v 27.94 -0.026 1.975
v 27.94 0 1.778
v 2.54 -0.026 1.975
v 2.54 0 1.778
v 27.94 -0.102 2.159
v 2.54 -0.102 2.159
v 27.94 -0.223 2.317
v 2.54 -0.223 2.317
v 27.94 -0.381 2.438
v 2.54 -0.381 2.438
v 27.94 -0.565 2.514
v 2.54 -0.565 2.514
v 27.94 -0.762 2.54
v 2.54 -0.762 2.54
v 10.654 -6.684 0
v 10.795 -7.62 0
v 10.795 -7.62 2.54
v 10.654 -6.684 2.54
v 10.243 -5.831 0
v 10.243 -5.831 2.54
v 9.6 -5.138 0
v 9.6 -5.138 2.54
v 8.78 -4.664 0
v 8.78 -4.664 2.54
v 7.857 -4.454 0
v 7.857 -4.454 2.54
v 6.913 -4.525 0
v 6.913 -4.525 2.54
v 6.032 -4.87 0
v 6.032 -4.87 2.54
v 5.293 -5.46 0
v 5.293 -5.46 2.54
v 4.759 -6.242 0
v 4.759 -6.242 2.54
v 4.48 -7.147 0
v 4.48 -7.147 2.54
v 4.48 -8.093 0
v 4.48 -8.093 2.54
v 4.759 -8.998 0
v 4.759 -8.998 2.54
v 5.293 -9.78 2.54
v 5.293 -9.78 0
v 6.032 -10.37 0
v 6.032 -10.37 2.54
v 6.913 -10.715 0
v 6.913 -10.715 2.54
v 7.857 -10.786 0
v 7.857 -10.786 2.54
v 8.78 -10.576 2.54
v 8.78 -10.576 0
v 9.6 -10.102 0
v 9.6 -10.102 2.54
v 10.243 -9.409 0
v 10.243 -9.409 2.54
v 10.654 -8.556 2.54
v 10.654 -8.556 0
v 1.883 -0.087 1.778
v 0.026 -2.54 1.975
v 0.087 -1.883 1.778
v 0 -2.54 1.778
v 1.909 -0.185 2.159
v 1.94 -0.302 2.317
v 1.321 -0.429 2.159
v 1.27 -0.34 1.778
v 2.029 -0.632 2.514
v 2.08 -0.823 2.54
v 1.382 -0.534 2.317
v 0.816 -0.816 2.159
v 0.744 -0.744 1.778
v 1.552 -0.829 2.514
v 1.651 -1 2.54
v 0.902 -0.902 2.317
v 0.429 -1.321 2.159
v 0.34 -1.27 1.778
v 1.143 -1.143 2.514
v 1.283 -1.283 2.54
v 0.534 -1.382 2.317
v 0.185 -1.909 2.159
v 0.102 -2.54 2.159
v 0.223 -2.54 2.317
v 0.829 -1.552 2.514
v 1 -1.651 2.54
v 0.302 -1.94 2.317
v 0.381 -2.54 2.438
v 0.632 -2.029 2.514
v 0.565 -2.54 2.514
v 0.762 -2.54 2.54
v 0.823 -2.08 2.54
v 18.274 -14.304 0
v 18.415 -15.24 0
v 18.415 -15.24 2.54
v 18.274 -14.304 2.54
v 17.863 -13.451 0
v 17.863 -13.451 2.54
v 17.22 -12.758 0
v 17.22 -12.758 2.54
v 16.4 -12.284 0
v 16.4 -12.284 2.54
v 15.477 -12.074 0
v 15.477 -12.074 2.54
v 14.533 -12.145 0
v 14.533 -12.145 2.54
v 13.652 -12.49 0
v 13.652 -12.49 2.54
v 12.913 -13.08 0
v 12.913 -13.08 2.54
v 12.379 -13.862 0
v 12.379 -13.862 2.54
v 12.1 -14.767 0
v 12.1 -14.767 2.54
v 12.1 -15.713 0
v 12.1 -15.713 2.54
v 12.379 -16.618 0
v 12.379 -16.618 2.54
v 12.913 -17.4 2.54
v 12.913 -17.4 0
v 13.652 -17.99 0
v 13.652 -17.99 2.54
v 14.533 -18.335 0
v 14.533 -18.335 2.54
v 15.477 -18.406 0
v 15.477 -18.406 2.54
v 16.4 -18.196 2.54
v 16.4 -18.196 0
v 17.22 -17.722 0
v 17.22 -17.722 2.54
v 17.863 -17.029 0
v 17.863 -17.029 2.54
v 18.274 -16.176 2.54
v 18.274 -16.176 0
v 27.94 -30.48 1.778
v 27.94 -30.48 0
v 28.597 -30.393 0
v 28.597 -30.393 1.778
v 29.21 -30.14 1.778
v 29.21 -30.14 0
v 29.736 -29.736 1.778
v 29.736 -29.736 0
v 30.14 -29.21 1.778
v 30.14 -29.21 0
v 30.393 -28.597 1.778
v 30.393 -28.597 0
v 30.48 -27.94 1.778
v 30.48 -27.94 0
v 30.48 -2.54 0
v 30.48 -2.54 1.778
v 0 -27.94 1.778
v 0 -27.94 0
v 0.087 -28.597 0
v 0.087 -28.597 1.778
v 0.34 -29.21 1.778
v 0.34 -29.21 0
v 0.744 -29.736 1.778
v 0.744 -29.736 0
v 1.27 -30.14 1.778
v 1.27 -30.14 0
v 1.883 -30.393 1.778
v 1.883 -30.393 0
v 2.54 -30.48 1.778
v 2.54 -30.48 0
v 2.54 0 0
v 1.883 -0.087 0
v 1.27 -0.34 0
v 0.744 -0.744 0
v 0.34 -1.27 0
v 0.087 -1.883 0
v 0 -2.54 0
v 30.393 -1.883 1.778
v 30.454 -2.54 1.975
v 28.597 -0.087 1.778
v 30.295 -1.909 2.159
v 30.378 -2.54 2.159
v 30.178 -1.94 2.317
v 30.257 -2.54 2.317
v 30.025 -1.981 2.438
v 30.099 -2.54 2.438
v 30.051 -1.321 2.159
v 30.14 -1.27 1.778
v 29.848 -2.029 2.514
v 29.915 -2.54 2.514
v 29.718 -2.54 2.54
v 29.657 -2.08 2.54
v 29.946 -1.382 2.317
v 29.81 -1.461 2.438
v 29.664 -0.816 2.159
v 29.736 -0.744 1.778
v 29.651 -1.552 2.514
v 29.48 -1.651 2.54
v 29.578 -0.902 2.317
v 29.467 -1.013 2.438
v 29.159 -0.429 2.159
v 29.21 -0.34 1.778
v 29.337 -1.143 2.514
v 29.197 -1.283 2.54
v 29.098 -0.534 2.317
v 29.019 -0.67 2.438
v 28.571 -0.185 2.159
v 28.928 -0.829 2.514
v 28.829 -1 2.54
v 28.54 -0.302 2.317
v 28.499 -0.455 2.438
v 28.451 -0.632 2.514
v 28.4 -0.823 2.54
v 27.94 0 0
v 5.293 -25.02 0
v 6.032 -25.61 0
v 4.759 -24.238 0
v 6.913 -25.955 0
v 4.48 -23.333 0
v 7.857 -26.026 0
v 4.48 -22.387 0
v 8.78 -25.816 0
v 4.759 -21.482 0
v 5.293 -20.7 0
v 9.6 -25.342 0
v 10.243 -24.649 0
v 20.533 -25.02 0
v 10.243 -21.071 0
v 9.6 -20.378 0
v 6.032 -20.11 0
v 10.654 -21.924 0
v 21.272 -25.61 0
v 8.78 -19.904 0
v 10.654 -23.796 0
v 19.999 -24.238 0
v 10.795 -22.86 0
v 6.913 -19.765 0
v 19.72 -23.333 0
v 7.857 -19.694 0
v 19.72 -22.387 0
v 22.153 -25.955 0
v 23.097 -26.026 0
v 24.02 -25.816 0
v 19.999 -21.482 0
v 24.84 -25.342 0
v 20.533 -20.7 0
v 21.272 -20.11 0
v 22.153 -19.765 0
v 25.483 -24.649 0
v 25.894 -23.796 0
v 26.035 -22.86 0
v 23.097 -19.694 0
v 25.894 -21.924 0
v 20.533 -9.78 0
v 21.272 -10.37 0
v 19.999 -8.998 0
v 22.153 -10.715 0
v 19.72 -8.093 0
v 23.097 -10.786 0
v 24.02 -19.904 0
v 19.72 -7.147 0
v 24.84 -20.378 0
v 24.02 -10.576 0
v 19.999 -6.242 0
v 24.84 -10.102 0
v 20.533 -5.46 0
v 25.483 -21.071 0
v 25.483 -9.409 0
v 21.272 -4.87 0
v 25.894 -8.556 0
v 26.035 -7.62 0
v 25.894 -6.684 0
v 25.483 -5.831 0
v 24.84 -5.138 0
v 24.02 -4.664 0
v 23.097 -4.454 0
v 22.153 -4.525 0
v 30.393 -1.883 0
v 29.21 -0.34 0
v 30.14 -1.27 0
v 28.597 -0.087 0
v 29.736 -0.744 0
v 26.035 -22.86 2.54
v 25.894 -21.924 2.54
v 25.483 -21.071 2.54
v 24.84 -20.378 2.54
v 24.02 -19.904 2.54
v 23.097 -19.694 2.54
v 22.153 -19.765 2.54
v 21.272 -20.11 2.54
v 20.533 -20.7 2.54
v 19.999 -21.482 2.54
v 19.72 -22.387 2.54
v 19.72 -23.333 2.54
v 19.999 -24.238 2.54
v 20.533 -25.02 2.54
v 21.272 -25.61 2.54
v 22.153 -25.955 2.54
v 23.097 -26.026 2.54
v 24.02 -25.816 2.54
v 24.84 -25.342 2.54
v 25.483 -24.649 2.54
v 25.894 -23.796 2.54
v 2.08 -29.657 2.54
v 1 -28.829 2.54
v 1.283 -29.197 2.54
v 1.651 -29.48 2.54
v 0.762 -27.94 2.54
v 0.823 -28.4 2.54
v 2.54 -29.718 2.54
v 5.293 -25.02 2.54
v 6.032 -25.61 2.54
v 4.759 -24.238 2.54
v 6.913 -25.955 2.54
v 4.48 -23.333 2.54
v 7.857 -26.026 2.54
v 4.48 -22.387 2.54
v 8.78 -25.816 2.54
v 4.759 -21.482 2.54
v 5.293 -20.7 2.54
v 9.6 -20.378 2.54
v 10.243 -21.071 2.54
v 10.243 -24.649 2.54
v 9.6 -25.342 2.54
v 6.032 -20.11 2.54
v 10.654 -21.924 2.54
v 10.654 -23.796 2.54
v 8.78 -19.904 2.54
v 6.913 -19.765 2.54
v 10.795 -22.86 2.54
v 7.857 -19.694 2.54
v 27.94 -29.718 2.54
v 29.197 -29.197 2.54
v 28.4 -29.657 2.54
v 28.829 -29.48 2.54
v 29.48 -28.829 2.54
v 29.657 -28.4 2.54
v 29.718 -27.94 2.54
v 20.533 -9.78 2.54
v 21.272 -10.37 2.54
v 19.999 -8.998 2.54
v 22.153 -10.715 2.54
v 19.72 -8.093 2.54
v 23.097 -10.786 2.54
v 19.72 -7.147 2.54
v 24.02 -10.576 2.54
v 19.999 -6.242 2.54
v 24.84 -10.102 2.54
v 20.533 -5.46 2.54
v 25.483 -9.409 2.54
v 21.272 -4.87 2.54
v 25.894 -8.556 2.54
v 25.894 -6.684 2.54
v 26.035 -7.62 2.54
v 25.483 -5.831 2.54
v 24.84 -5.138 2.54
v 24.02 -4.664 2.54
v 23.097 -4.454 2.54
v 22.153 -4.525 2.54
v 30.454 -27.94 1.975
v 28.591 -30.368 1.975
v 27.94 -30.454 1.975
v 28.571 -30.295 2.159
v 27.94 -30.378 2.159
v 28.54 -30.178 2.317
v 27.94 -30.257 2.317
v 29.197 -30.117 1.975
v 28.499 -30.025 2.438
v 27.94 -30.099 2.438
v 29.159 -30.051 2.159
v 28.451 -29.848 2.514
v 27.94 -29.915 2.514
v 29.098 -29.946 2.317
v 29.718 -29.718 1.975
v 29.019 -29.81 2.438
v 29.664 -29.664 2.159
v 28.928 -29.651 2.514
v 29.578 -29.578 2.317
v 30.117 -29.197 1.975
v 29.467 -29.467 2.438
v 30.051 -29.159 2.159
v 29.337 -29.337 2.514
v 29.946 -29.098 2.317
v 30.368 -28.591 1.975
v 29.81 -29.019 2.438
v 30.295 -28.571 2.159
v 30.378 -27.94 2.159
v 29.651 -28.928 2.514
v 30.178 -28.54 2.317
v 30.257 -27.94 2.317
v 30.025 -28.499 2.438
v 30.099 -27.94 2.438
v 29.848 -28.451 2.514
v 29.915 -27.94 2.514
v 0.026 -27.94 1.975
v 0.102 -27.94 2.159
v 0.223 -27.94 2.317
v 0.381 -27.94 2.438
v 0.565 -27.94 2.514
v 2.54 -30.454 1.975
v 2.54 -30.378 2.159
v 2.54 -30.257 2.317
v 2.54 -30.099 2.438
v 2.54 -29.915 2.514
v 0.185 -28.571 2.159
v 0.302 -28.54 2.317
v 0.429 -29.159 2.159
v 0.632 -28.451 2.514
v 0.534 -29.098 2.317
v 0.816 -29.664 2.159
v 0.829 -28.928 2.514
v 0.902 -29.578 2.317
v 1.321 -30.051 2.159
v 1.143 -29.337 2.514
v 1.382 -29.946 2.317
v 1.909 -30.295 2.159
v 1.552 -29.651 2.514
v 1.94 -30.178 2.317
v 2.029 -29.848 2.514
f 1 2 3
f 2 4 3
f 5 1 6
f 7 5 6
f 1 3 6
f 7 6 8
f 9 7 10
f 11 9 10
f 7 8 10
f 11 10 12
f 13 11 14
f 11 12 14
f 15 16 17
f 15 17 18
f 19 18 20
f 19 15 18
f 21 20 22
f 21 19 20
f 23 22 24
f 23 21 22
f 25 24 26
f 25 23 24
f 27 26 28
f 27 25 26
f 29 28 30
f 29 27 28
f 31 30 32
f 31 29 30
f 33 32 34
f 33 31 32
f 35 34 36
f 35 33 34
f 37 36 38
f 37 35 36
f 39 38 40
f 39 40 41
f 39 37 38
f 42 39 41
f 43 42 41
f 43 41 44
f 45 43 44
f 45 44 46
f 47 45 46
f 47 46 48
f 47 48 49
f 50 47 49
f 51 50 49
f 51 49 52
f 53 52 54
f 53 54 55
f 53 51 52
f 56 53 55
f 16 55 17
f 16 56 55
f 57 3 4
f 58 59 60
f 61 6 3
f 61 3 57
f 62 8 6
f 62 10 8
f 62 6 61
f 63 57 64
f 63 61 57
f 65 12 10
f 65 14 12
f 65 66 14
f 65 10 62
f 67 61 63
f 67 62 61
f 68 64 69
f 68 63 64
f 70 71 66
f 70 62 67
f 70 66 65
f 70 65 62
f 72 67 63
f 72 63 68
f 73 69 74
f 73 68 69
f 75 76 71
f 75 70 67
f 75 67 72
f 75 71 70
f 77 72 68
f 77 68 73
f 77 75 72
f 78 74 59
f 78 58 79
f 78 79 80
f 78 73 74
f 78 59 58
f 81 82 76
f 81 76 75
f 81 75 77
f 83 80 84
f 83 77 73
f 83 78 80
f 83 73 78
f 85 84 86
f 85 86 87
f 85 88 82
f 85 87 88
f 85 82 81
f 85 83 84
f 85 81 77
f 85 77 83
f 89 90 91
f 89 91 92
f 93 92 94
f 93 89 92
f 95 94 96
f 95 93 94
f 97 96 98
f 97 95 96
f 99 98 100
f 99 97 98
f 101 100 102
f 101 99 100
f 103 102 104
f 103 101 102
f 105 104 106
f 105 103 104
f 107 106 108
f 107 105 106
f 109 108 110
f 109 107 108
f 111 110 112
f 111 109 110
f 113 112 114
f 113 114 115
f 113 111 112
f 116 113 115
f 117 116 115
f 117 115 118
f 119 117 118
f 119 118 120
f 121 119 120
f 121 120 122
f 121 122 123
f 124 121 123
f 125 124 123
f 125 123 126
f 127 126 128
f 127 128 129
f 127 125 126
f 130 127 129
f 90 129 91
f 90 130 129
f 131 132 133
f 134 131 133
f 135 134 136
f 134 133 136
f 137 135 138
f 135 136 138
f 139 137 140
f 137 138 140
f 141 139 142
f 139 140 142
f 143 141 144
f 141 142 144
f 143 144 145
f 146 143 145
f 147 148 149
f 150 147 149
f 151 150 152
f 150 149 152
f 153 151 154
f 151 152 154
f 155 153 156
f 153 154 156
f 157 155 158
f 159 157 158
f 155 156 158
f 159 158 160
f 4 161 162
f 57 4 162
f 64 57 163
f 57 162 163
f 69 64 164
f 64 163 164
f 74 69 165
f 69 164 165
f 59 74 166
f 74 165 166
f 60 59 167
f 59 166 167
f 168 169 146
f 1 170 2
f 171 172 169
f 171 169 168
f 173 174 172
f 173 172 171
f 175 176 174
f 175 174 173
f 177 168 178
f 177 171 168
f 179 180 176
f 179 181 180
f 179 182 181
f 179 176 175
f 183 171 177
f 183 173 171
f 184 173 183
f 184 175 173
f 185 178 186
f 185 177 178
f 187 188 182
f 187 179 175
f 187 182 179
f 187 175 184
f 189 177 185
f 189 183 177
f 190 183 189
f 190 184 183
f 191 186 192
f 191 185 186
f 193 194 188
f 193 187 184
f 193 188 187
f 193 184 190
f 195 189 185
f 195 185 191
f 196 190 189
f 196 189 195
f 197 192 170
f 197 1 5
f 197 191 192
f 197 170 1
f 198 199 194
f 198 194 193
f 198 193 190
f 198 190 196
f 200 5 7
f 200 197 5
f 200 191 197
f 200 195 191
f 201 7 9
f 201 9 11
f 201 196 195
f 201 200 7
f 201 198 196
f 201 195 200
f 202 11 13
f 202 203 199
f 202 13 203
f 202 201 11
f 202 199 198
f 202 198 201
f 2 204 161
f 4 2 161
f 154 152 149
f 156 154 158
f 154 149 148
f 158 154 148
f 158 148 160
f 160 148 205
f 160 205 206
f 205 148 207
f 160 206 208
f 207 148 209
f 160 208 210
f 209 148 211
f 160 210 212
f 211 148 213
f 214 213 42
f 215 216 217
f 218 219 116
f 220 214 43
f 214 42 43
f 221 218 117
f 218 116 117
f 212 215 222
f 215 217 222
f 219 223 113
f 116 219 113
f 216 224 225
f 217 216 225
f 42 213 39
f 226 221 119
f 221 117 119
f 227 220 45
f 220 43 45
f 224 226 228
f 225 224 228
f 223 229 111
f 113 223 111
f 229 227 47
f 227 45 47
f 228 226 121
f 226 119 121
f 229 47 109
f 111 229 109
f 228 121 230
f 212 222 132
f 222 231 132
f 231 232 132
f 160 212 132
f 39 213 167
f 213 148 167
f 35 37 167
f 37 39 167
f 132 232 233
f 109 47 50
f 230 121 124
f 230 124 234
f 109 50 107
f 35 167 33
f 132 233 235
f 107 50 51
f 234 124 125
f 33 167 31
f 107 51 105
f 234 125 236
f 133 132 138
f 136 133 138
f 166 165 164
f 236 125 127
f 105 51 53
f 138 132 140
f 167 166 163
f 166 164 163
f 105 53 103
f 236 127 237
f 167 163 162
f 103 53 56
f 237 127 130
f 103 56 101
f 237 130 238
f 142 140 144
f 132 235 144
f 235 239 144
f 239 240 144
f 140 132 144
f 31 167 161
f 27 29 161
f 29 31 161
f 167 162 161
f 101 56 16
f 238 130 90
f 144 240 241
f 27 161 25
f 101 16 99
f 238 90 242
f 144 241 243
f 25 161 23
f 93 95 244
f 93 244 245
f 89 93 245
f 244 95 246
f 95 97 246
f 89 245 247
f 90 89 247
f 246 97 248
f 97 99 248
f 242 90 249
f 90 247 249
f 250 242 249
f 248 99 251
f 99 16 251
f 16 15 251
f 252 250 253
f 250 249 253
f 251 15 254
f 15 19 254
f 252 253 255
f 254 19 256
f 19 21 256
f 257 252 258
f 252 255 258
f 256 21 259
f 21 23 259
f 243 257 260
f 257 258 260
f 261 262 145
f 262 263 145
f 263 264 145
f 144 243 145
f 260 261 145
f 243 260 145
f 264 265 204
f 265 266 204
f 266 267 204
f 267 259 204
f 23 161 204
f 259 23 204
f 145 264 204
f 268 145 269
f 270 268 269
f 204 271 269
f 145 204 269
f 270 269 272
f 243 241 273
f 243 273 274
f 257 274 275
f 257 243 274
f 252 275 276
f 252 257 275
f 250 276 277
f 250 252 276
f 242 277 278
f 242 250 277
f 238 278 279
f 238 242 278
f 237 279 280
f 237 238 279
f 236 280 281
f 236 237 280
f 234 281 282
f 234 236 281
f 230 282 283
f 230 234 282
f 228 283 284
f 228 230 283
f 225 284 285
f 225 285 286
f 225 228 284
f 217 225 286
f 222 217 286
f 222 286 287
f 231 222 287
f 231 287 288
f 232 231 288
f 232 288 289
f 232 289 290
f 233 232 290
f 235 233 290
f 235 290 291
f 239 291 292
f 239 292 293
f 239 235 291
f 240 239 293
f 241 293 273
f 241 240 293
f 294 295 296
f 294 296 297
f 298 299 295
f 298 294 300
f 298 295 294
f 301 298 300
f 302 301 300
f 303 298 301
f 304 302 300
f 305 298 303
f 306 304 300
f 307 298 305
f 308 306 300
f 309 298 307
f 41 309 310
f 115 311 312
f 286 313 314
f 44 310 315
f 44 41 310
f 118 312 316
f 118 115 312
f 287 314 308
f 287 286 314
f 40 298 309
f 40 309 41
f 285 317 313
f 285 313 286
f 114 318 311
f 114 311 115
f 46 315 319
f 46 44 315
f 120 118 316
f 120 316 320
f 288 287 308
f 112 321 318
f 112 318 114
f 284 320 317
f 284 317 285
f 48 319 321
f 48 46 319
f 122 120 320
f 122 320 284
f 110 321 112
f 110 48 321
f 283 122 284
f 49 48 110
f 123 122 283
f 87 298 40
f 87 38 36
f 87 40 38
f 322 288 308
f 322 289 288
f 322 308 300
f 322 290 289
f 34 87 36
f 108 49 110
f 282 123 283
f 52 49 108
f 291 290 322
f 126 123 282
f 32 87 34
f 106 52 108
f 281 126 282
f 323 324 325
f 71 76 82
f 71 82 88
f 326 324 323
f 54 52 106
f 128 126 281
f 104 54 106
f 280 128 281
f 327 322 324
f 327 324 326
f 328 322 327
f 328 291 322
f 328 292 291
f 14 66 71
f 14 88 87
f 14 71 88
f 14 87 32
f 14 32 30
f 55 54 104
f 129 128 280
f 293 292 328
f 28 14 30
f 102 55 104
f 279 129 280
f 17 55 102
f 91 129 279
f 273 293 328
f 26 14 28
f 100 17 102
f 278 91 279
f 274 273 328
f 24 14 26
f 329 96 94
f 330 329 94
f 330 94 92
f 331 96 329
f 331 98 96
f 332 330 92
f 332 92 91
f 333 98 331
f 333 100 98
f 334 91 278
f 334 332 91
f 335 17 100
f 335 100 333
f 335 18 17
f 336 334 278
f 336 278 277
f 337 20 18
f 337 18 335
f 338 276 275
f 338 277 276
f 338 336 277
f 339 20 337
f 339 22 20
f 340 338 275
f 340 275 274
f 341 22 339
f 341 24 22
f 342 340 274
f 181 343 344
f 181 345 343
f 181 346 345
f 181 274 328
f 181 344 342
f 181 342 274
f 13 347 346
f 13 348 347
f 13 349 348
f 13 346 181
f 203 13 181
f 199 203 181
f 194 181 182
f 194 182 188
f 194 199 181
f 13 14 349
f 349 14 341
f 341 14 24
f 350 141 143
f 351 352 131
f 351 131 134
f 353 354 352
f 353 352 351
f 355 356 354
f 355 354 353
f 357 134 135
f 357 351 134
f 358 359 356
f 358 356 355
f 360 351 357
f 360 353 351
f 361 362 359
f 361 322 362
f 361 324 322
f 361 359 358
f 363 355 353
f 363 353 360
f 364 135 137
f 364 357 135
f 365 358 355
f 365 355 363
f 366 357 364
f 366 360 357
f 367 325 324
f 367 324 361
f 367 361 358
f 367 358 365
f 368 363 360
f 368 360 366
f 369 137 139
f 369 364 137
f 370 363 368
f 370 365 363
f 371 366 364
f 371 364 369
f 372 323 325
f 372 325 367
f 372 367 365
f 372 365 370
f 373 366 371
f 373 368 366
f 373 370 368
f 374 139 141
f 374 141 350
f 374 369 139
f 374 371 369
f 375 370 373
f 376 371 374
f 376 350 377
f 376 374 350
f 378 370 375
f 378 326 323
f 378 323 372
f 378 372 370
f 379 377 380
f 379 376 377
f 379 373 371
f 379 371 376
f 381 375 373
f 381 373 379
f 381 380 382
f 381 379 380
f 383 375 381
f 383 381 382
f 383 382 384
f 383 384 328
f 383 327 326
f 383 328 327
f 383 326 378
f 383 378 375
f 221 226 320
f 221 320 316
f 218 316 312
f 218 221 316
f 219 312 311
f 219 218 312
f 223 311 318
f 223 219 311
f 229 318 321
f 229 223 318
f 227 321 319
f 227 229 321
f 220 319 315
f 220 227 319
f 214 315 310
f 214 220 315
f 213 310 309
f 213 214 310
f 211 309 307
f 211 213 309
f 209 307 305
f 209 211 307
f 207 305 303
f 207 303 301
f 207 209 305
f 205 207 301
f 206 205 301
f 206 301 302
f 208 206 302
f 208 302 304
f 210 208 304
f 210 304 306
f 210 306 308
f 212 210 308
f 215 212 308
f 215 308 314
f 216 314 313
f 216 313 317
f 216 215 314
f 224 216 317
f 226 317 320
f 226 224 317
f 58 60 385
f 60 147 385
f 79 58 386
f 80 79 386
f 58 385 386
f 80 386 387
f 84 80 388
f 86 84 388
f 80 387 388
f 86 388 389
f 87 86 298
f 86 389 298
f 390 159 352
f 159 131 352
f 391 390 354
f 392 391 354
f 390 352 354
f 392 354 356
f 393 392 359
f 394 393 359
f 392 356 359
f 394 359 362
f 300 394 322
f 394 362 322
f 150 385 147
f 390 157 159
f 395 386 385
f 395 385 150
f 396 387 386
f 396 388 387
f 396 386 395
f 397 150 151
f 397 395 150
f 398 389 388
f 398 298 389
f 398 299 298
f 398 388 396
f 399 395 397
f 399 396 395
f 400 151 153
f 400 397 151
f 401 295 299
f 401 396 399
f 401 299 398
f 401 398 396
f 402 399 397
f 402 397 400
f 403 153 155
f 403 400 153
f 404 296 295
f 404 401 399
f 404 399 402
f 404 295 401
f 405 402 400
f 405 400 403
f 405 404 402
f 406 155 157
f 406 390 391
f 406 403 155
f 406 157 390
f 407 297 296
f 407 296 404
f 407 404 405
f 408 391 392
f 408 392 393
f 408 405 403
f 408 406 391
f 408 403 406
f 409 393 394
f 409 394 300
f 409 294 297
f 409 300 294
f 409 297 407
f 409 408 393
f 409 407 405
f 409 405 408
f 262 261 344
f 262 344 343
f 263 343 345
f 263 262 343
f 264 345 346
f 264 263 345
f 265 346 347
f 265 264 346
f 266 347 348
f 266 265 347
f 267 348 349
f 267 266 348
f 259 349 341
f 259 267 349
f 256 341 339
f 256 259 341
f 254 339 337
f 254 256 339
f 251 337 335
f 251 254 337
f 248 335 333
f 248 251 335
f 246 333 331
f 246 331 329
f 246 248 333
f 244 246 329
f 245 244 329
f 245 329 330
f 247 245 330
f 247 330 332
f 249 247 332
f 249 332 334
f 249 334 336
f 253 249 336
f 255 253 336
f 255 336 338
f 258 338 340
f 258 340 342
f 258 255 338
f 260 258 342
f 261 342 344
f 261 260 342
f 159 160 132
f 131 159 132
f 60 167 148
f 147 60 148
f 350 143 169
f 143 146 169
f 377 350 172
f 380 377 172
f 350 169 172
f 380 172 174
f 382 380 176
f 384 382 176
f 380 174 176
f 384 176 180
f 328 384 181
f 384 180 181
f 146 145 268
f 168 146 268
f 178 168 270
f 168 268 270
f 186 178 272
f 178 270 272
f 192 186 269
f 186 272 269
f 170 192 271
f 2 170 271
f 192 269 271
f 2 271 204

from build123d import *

# Parameters (mm, degrees)
F0_R     = 3.175
F1_DEPTH = 2.54
F2_R     = 0.762


with BuildPart() as f1:
    # F0 (on Top) → F1 (new body)
    with BuildSketch(Plane.XY):
        with BuildLine():
            Line((27.94, 0), (2.54, 0))
            ThreePointArc((2.54, 0), (0.743949, -0.743949), (0, -2.54))
            Line((0, -2.54), (0, -27.94))
            ThreePointArc((0, -27.94), (0.743949, -29.736051), (2.54, -30.48))
            Line((2.54, -30.48), (27.94, -30.48))
            ThreePointArc((27.94, -30.48), (29.736051, -29.736051), (30.48, -27.94))
            Line((30.48, -27.94), (30.48, -2.54))
            ThreePointArc((30.48, -2.54), (29.736051, -0.743949), (27.94, 0))
        make_face()
        with Locations((7.62, -22.86)):
            Circle(F0_R, mode=Mode.SUBTRACT)
        with Locations((22.86, -22.86)):
            Circle(F0_R, mode=Mode.SUBTRACT)
        with Locations((15.24, -15.24)):
            Circle(F0_R, mode=Mode.SUBTRACT)
        with Locations((7.62, -7.62)):
            Circle(F0_R, mode=Mode.SUBTRACT)
        with Locations((22.86, -7.62)):
            Circle(F0_R, mode=Mode.SUBTRACT)
    extrude(amount=F1_DEPTH)

    # F2
    f2_edges = [f1.edges().sort_by_distance(p)[0] for p in [
        (30.48, -15.24, 2.54),
    ]]
    fillet(f2_edges, radius=F2_R)


solid = f1.part
